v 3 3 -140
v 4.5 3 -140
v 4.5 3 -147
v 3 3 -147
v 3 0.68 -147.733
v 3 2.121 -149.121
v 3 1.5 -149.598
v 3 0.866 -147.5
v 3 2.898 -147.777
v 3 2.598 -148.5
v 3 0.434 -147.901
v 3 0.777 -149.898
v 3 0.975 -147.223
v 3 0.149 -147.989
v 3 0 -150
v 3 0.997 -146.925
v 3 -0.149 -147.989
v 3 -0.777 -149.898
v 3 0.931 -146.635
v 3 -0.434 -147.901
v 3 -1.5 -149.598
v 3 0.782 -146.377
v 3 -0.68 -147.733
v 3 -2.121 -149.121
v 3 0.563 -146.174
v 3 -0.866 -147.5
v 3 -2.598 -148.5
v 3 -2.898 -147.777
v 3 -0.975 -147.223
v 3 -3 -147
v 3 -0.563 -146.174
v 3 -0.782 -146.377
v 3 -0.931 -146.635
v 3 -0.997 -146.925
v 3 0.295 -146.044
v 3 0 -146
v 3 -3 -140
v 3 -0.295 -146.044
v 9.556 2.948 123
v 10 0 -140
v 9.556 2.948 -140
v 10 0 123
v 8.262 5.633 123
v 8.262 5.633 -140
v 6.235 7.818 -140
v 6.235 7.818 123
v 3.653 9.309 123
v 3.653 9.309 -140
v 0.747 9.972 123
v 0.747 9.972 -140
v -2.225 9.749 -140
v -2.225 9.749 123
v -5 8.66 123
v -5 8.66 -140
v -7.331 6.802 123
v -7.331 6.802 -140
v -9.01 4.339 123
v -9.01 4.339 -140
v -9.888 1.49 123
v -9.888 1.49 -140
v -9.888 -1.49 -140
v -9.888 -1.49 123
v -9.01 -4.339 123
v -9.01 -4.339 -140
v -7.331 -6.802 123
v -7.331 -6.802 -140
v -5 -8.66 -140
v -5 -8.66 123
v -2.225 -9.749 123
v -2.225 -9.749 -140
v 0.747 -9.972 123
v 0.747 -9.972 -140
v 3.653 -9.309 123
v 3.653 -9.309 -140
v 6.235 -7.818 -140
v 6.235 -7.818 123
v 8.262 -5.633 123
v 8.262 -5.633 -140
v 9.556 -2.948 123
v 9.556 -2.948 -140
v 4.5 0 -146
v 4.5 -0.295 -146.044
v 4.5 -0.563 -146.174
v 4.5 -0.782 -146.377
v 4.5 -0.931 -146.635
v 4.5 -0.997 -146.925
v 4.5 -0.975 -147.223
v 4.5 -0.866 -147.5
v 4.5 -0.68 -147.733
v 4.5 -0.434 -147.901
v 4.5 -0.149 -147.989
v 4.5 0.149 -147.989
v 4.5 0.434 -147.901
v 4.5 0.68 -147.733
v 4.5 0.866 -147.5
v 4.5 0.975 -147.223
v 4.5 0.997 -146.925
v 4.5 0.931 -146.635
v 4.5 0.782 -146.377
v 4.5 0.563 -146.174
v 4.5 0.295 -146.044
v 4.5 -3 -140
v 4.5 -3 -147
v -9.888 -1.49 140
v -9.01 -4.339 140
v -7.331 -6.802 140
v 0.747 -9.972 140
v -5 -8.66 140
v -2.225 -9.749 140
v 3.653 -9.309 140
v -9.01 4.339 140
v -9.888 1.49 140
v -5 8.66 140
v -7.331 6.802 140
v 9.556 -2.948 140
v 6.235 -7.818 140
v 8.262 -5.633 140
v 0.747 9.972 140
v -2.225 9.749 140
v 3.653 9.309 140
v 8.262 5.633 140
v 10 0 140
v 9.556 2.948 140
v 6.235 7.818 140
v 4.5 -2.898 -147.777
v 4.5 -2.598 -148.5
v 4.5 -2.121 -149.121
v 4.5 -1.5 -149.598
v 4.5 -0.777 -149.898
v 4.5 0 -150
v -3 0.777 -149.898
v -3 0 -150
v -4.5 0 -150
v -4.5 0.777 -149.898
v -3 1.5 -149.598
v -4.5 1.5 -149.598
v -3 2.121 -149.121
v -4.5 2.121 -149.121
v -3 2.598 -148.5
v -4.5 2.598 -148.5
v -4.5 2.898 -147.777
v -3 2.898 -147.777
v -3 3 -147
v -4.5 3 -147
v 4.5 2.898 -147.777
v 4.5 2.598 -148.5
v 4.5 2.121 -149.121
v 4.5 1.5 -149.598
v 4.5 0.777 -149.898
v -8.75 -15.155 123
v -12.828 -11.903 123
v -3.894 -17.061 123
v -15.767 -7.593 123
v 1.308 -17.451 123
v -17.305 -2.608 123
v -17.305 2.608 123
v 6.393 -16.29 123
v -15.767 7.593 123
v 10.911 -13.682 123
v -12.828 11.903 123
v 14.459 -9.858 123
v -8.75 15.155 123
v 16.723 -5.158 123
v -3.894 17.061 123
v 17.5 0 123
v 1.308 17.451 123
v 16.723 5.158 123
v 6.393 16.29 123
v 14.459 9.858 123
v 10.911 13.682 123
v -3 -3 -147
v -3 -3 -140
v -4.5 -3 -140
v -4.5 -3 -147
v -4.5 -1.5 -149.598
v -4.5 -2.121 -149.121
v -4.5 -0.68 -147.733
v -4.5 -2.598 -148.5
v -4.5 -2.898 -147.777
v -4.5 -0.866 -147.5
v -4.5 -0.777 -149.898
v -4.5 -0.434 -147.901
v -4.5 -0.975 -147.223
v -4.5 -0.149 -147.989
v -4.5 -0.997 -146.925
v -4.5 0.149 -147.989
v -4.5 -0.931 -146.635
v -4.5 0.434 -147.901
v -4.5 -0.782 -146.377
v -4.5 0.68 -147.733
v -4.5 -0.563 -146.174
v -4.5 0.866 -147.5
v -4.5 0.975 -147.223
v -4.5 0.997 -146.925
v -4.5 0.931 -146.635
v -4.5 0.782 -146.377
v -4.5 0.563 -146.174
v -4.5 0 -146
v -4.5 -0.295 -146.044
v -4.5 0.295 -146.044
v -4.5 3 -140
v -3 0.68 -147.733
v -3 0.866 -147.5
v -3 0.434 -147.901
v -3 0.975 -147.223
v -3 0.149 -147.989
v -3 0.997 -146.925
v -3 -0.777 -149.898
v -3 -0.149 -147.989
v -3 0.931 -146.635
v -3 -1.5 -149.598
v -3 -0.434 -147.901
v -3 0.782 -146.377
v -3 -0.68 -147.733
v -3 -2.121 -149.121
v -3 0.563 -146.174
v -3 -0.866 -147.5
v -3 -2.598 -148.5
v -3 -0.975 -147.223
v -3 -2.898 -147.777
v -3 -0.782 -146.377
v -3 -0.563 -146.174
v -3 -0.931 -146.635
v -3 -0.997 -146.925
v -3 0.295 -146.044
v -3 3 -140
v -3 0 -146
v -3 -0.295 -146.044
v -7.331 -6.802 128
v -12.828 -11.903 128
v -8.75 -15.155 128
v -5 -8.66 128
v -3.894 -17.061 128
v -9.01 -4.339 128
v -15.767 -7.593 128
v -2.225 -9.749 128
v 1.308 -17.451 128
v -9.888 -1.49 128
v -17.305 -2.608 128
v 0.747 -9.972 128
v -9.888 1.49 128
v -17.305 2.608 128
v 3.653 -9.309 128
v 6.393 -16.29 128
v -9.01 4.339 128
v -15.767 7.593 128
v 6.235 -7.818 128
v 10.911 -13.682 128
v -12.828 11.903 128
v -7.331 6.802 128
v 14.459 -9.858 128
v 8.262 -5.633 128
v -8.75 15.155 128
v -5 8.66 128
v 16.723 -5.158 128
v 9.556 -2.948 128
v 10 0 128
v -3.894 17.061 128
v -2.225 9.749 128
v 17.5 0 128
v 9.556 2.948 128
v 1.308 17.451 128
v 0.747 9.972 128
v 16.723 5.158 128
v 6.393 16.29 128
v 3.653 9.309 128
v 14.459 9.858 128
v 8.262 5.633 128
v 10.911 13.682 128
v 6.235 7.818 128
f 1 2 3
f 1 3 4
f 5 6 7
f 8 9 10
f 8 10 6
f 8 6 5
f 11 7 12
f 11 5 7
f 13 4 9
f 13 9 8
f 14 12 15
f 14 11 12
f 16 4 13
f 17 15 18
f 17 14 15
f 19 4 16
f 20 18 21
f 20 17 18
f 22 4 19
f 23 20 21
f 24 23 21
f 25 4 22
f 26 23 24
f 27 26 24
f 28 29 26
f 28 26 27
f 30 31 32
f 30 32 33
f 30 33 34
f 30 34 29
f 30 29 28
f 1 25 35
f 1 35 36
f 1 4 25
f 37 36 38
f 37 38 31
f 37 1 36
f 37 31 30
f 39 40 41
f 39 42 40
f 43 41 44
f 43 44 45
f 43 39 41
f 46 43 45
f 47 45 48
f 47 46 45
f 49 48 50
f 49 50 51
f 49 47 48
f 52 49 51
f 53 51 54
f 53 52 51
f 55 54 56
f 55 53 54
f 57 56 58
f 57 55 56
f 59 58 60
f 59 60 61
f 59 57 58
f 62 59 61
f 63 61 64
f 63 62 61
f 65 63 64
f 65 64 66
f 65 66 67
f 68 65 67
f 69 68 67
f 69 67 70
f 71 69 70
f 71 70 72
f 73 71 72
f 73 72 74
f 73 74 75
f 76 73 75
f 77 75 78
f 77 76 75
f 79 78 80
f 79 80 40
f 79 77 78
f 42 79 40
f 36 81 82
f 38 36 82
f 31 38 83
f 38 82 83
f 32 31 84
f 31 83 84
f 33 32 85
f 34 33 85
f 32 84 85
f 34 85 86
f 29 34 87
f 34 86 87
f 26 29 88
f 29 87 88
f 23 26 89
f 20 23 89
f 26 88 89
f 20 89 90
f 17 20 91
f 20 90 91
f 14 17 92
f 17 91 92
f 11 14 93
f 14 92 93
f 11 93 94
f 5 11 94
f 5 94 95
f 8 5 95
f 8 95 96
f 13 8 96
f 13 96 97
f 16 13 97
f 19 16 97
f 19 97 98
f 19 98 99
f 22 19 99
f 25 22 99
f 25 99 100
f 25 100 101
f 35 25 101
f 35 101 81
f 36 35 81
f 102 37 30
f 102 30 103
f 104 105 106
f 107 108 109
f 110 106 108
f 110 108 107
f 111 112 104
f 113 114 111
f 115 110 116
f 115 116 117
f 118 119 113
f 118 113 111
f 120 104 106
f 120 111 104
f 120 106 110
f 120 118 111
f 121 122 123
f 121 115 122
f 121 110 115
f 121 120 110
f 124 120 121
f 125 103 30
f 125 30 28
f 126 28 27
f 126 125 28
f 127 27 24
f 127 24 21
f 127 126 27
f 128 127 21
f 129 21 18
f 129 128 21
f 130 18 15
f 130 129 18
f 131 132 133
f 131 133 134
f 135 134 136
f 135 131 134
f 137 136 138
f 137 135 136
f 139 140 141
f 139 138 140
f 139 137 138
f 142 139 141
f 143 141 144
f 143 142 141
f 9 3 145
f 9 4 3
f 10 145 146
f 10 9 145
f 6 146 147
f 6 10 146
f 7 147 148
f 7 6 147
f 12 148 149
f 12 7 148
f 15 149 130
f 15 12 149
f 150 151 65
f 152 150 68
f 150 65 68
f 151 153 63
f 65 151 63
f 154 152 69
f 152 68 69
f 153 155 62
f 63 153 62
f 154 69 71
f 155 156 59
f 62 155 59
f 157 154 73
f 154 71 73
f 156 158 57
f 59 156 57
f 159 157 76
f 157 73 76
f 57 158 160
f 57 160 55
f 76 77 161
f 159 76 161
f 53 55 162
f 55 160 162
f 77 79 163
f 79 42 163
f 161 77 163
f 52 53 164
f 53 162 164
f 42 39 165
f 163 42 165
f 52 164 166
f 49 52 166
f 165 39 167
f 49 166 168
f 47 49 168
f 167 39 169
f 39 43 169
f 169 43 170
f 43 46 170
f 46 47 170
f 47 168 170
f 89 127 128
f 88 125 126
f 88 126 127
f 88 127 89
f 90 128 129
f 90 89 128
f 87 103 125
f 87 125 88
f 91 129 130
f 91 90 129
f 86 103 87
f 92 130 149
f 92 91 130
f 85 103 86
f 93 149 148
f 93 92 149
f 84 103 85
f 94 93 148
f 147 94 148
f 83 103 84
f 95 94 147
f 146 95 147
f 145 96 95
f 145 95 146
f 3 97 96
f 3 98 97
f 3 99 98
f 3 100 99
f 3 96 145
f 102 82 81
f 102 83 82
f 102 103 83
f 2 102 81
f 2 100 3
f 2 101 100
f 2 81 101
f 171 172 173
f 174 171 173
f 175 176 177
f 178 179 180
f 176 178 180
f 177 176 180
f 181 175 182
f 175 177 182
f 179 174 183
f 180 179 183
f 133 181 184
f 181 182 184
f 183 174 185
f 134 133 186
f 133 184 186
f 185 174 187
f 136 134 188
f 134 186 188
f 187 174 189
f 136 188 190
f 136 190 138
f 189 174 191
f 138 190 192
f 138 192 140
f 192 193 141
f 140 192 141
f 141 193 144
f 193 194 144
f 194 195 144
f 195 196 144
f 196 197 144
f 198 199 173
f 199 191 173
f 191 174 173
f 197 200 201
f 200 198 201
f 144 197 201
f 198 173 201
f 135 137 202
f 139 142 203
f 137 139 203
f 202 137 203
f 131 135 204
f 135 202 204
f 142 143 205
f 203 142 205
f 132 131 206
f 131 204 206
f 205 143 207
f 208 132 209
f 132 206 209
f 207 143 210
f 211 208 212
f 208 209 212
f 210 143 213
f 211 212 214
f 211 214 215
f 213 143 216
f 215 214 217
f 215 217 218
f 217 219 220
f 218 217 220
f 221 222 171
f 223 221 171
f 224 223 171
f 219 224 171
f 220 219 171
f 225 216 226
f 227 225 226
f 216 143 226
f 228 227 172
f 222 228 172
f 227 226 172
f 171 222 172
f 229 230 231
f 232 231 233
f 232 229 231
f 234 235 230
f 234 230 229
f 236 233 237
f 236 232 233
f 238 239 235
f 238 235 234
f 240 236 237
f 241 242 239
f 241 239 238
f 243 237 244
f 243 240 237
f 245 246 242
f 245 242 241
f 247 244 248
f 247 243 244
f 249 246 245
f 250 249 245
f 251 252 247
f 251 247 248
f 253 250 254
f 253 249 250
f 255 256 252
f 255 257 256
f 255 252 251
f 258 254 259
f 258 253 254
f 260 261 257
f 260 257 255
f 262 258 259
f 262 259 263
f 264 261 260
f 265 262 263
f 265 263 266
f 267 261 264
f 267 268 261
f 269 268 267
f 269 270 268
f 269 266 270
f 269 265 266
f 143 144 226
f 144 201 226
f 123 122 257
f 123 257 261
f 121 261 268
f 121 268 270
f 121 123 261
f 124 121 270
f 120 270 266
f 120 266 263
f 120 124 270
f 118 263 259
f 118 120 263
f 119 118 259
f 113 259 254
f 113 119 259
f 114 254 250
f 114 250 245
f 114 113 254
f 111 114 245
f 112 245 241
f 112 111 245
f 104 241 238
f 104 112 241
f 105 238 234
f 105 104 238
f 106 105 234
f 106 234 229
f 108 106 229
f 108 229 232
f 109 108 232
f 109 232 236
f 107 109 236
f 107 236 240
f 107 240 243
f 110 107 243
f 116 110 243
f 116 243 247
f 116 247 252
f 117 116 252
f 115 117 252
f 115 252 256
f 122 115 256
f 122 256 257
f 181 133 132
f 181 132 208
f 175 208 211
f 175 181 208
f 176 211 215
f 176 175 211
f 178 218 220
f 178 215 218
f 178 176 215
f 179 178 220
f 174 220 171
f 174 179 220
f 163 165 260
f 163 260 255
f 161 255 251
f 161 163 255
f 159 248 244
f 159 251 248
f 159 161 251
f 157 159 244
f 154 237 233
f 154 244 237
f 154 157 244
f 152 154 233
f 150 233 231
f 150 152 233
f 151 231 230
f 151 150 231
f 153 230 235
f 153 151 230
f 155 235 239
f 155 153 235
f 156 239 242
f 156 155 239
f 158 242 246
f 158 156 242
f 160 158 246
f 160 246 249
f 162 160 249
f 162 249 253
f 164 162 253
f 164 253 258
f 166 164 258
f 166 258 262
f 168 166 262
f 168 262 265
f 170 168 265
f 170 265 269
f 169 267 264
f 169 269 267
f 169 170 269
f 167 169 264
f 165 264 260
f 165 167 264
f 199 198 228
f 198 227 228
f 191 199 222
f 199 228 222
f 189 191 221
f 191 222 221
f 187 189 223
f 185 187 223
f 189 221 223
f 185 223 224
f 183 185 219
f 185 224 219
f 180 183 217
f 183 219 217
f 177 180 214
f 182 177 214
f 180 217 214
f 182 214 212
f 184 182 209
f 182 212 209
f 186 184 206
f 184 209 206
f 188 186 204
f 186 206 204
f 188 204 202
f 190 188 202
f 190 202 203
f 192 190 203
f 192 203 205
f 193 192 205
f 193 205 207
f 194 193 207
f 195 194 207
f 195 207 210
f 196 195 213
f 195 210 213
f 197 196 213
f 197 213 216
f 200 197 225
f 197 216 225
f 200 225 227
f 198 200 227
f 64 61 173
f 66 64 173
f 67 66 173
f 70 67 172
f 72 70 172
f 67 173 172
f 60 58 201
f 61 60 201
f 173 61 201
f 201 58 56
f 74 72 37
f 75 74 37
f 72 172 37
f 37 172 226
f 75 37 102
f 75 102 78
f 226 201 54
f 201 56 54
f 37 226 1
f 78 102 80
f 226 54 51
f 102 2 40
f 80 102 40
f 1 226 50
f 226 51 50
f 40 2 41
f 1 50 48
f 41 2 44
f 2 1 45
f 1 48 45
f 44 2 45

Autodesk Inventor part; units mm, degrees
ref_plane "YZ Plane" through (0, 0, 0) normal (1, 0, 0) x (0, 1, 0)
ref_plane "XZ Plane" through (0, 0, 0) normal (0, 1, 0) x (-1, 0, 0)
ref_plane "XY Plane" through (0, 0, 0) normal (0, 0, 1) x (1, 0, 0)
sketch "草图1" plane through (0, 0, 0) normal (0, 0, 1) x (1, 0, 0)
  circle A0 centre (0, 0) radius 10
  dimension "d0" = 20
extrude "拉伸1" add sketch "草图1" along normal mid plane 280
sketch "草图2" plane through (0, 0, -140) normal (0, 0, -1) x (-1, 0, 0)
  line L0 (-4.5, 3) -> (-3, 3)
  line L1 (-3, 3) -> (-3, -3)
  line L2 (-3, -3) -> (-4.5, -3)
  line L3 (-4.5, -3) -> (-4.5, 3)
  line L4 (0, 0) -> (0, 6.2448)
  line L5 (4.5, 3) -> (3, 3)
  line L6 (3, 3) -> (3, -3)
  line L7 (3, -3) -> (4.5, -3)
  line L8 (4.5, -3) -> (4.5, 3)
  point P0 (-3, 0)
  point P1 (3, 0)
  dimension "d3" = 1.5
  dimension "d4" = 6
  dimension "d5" = 6
extrude "拉伸2" add sketch "草图2" along normal blind 10
full round fillet "全圆角1" first side at (4, -3, -143.3333) centre faces at (4, 1, -150) second side at (3.5, 3, -143.3333)
full round fillet "全圆角2" first side at (-3.5, -3, -143.3333) centre faces at (-3.5, 1, -150) second side at (-4, 3, -143.3333)
sketch "草图3" plane through (-4.5, -3, -140) normal (-1, 0, 0) x (0, 0, 1)
  arc A0 (-7, 6) -> (-7, 0) centre (-7, 3) ccw projected
  point P0 (140, 3)
hole "孔1" at (-4.5, 0, -147) direction (1, 0, 0) diameter 2 end through all
ref_plane "工作平面1" through (0, 0, 123) normal (0, 0, 1) x (1, 0, 0)
sketch "草图4" plane through (0, 0, 123) normal (0, 0, 1) x (1, 0, 0)
  circle A0 centre (0, 0) radius 17.5
  dimension "d16" = 35
extrude "拉伸3" add sketch "草图4" along normal blind 5
properties part number "顶杆"
